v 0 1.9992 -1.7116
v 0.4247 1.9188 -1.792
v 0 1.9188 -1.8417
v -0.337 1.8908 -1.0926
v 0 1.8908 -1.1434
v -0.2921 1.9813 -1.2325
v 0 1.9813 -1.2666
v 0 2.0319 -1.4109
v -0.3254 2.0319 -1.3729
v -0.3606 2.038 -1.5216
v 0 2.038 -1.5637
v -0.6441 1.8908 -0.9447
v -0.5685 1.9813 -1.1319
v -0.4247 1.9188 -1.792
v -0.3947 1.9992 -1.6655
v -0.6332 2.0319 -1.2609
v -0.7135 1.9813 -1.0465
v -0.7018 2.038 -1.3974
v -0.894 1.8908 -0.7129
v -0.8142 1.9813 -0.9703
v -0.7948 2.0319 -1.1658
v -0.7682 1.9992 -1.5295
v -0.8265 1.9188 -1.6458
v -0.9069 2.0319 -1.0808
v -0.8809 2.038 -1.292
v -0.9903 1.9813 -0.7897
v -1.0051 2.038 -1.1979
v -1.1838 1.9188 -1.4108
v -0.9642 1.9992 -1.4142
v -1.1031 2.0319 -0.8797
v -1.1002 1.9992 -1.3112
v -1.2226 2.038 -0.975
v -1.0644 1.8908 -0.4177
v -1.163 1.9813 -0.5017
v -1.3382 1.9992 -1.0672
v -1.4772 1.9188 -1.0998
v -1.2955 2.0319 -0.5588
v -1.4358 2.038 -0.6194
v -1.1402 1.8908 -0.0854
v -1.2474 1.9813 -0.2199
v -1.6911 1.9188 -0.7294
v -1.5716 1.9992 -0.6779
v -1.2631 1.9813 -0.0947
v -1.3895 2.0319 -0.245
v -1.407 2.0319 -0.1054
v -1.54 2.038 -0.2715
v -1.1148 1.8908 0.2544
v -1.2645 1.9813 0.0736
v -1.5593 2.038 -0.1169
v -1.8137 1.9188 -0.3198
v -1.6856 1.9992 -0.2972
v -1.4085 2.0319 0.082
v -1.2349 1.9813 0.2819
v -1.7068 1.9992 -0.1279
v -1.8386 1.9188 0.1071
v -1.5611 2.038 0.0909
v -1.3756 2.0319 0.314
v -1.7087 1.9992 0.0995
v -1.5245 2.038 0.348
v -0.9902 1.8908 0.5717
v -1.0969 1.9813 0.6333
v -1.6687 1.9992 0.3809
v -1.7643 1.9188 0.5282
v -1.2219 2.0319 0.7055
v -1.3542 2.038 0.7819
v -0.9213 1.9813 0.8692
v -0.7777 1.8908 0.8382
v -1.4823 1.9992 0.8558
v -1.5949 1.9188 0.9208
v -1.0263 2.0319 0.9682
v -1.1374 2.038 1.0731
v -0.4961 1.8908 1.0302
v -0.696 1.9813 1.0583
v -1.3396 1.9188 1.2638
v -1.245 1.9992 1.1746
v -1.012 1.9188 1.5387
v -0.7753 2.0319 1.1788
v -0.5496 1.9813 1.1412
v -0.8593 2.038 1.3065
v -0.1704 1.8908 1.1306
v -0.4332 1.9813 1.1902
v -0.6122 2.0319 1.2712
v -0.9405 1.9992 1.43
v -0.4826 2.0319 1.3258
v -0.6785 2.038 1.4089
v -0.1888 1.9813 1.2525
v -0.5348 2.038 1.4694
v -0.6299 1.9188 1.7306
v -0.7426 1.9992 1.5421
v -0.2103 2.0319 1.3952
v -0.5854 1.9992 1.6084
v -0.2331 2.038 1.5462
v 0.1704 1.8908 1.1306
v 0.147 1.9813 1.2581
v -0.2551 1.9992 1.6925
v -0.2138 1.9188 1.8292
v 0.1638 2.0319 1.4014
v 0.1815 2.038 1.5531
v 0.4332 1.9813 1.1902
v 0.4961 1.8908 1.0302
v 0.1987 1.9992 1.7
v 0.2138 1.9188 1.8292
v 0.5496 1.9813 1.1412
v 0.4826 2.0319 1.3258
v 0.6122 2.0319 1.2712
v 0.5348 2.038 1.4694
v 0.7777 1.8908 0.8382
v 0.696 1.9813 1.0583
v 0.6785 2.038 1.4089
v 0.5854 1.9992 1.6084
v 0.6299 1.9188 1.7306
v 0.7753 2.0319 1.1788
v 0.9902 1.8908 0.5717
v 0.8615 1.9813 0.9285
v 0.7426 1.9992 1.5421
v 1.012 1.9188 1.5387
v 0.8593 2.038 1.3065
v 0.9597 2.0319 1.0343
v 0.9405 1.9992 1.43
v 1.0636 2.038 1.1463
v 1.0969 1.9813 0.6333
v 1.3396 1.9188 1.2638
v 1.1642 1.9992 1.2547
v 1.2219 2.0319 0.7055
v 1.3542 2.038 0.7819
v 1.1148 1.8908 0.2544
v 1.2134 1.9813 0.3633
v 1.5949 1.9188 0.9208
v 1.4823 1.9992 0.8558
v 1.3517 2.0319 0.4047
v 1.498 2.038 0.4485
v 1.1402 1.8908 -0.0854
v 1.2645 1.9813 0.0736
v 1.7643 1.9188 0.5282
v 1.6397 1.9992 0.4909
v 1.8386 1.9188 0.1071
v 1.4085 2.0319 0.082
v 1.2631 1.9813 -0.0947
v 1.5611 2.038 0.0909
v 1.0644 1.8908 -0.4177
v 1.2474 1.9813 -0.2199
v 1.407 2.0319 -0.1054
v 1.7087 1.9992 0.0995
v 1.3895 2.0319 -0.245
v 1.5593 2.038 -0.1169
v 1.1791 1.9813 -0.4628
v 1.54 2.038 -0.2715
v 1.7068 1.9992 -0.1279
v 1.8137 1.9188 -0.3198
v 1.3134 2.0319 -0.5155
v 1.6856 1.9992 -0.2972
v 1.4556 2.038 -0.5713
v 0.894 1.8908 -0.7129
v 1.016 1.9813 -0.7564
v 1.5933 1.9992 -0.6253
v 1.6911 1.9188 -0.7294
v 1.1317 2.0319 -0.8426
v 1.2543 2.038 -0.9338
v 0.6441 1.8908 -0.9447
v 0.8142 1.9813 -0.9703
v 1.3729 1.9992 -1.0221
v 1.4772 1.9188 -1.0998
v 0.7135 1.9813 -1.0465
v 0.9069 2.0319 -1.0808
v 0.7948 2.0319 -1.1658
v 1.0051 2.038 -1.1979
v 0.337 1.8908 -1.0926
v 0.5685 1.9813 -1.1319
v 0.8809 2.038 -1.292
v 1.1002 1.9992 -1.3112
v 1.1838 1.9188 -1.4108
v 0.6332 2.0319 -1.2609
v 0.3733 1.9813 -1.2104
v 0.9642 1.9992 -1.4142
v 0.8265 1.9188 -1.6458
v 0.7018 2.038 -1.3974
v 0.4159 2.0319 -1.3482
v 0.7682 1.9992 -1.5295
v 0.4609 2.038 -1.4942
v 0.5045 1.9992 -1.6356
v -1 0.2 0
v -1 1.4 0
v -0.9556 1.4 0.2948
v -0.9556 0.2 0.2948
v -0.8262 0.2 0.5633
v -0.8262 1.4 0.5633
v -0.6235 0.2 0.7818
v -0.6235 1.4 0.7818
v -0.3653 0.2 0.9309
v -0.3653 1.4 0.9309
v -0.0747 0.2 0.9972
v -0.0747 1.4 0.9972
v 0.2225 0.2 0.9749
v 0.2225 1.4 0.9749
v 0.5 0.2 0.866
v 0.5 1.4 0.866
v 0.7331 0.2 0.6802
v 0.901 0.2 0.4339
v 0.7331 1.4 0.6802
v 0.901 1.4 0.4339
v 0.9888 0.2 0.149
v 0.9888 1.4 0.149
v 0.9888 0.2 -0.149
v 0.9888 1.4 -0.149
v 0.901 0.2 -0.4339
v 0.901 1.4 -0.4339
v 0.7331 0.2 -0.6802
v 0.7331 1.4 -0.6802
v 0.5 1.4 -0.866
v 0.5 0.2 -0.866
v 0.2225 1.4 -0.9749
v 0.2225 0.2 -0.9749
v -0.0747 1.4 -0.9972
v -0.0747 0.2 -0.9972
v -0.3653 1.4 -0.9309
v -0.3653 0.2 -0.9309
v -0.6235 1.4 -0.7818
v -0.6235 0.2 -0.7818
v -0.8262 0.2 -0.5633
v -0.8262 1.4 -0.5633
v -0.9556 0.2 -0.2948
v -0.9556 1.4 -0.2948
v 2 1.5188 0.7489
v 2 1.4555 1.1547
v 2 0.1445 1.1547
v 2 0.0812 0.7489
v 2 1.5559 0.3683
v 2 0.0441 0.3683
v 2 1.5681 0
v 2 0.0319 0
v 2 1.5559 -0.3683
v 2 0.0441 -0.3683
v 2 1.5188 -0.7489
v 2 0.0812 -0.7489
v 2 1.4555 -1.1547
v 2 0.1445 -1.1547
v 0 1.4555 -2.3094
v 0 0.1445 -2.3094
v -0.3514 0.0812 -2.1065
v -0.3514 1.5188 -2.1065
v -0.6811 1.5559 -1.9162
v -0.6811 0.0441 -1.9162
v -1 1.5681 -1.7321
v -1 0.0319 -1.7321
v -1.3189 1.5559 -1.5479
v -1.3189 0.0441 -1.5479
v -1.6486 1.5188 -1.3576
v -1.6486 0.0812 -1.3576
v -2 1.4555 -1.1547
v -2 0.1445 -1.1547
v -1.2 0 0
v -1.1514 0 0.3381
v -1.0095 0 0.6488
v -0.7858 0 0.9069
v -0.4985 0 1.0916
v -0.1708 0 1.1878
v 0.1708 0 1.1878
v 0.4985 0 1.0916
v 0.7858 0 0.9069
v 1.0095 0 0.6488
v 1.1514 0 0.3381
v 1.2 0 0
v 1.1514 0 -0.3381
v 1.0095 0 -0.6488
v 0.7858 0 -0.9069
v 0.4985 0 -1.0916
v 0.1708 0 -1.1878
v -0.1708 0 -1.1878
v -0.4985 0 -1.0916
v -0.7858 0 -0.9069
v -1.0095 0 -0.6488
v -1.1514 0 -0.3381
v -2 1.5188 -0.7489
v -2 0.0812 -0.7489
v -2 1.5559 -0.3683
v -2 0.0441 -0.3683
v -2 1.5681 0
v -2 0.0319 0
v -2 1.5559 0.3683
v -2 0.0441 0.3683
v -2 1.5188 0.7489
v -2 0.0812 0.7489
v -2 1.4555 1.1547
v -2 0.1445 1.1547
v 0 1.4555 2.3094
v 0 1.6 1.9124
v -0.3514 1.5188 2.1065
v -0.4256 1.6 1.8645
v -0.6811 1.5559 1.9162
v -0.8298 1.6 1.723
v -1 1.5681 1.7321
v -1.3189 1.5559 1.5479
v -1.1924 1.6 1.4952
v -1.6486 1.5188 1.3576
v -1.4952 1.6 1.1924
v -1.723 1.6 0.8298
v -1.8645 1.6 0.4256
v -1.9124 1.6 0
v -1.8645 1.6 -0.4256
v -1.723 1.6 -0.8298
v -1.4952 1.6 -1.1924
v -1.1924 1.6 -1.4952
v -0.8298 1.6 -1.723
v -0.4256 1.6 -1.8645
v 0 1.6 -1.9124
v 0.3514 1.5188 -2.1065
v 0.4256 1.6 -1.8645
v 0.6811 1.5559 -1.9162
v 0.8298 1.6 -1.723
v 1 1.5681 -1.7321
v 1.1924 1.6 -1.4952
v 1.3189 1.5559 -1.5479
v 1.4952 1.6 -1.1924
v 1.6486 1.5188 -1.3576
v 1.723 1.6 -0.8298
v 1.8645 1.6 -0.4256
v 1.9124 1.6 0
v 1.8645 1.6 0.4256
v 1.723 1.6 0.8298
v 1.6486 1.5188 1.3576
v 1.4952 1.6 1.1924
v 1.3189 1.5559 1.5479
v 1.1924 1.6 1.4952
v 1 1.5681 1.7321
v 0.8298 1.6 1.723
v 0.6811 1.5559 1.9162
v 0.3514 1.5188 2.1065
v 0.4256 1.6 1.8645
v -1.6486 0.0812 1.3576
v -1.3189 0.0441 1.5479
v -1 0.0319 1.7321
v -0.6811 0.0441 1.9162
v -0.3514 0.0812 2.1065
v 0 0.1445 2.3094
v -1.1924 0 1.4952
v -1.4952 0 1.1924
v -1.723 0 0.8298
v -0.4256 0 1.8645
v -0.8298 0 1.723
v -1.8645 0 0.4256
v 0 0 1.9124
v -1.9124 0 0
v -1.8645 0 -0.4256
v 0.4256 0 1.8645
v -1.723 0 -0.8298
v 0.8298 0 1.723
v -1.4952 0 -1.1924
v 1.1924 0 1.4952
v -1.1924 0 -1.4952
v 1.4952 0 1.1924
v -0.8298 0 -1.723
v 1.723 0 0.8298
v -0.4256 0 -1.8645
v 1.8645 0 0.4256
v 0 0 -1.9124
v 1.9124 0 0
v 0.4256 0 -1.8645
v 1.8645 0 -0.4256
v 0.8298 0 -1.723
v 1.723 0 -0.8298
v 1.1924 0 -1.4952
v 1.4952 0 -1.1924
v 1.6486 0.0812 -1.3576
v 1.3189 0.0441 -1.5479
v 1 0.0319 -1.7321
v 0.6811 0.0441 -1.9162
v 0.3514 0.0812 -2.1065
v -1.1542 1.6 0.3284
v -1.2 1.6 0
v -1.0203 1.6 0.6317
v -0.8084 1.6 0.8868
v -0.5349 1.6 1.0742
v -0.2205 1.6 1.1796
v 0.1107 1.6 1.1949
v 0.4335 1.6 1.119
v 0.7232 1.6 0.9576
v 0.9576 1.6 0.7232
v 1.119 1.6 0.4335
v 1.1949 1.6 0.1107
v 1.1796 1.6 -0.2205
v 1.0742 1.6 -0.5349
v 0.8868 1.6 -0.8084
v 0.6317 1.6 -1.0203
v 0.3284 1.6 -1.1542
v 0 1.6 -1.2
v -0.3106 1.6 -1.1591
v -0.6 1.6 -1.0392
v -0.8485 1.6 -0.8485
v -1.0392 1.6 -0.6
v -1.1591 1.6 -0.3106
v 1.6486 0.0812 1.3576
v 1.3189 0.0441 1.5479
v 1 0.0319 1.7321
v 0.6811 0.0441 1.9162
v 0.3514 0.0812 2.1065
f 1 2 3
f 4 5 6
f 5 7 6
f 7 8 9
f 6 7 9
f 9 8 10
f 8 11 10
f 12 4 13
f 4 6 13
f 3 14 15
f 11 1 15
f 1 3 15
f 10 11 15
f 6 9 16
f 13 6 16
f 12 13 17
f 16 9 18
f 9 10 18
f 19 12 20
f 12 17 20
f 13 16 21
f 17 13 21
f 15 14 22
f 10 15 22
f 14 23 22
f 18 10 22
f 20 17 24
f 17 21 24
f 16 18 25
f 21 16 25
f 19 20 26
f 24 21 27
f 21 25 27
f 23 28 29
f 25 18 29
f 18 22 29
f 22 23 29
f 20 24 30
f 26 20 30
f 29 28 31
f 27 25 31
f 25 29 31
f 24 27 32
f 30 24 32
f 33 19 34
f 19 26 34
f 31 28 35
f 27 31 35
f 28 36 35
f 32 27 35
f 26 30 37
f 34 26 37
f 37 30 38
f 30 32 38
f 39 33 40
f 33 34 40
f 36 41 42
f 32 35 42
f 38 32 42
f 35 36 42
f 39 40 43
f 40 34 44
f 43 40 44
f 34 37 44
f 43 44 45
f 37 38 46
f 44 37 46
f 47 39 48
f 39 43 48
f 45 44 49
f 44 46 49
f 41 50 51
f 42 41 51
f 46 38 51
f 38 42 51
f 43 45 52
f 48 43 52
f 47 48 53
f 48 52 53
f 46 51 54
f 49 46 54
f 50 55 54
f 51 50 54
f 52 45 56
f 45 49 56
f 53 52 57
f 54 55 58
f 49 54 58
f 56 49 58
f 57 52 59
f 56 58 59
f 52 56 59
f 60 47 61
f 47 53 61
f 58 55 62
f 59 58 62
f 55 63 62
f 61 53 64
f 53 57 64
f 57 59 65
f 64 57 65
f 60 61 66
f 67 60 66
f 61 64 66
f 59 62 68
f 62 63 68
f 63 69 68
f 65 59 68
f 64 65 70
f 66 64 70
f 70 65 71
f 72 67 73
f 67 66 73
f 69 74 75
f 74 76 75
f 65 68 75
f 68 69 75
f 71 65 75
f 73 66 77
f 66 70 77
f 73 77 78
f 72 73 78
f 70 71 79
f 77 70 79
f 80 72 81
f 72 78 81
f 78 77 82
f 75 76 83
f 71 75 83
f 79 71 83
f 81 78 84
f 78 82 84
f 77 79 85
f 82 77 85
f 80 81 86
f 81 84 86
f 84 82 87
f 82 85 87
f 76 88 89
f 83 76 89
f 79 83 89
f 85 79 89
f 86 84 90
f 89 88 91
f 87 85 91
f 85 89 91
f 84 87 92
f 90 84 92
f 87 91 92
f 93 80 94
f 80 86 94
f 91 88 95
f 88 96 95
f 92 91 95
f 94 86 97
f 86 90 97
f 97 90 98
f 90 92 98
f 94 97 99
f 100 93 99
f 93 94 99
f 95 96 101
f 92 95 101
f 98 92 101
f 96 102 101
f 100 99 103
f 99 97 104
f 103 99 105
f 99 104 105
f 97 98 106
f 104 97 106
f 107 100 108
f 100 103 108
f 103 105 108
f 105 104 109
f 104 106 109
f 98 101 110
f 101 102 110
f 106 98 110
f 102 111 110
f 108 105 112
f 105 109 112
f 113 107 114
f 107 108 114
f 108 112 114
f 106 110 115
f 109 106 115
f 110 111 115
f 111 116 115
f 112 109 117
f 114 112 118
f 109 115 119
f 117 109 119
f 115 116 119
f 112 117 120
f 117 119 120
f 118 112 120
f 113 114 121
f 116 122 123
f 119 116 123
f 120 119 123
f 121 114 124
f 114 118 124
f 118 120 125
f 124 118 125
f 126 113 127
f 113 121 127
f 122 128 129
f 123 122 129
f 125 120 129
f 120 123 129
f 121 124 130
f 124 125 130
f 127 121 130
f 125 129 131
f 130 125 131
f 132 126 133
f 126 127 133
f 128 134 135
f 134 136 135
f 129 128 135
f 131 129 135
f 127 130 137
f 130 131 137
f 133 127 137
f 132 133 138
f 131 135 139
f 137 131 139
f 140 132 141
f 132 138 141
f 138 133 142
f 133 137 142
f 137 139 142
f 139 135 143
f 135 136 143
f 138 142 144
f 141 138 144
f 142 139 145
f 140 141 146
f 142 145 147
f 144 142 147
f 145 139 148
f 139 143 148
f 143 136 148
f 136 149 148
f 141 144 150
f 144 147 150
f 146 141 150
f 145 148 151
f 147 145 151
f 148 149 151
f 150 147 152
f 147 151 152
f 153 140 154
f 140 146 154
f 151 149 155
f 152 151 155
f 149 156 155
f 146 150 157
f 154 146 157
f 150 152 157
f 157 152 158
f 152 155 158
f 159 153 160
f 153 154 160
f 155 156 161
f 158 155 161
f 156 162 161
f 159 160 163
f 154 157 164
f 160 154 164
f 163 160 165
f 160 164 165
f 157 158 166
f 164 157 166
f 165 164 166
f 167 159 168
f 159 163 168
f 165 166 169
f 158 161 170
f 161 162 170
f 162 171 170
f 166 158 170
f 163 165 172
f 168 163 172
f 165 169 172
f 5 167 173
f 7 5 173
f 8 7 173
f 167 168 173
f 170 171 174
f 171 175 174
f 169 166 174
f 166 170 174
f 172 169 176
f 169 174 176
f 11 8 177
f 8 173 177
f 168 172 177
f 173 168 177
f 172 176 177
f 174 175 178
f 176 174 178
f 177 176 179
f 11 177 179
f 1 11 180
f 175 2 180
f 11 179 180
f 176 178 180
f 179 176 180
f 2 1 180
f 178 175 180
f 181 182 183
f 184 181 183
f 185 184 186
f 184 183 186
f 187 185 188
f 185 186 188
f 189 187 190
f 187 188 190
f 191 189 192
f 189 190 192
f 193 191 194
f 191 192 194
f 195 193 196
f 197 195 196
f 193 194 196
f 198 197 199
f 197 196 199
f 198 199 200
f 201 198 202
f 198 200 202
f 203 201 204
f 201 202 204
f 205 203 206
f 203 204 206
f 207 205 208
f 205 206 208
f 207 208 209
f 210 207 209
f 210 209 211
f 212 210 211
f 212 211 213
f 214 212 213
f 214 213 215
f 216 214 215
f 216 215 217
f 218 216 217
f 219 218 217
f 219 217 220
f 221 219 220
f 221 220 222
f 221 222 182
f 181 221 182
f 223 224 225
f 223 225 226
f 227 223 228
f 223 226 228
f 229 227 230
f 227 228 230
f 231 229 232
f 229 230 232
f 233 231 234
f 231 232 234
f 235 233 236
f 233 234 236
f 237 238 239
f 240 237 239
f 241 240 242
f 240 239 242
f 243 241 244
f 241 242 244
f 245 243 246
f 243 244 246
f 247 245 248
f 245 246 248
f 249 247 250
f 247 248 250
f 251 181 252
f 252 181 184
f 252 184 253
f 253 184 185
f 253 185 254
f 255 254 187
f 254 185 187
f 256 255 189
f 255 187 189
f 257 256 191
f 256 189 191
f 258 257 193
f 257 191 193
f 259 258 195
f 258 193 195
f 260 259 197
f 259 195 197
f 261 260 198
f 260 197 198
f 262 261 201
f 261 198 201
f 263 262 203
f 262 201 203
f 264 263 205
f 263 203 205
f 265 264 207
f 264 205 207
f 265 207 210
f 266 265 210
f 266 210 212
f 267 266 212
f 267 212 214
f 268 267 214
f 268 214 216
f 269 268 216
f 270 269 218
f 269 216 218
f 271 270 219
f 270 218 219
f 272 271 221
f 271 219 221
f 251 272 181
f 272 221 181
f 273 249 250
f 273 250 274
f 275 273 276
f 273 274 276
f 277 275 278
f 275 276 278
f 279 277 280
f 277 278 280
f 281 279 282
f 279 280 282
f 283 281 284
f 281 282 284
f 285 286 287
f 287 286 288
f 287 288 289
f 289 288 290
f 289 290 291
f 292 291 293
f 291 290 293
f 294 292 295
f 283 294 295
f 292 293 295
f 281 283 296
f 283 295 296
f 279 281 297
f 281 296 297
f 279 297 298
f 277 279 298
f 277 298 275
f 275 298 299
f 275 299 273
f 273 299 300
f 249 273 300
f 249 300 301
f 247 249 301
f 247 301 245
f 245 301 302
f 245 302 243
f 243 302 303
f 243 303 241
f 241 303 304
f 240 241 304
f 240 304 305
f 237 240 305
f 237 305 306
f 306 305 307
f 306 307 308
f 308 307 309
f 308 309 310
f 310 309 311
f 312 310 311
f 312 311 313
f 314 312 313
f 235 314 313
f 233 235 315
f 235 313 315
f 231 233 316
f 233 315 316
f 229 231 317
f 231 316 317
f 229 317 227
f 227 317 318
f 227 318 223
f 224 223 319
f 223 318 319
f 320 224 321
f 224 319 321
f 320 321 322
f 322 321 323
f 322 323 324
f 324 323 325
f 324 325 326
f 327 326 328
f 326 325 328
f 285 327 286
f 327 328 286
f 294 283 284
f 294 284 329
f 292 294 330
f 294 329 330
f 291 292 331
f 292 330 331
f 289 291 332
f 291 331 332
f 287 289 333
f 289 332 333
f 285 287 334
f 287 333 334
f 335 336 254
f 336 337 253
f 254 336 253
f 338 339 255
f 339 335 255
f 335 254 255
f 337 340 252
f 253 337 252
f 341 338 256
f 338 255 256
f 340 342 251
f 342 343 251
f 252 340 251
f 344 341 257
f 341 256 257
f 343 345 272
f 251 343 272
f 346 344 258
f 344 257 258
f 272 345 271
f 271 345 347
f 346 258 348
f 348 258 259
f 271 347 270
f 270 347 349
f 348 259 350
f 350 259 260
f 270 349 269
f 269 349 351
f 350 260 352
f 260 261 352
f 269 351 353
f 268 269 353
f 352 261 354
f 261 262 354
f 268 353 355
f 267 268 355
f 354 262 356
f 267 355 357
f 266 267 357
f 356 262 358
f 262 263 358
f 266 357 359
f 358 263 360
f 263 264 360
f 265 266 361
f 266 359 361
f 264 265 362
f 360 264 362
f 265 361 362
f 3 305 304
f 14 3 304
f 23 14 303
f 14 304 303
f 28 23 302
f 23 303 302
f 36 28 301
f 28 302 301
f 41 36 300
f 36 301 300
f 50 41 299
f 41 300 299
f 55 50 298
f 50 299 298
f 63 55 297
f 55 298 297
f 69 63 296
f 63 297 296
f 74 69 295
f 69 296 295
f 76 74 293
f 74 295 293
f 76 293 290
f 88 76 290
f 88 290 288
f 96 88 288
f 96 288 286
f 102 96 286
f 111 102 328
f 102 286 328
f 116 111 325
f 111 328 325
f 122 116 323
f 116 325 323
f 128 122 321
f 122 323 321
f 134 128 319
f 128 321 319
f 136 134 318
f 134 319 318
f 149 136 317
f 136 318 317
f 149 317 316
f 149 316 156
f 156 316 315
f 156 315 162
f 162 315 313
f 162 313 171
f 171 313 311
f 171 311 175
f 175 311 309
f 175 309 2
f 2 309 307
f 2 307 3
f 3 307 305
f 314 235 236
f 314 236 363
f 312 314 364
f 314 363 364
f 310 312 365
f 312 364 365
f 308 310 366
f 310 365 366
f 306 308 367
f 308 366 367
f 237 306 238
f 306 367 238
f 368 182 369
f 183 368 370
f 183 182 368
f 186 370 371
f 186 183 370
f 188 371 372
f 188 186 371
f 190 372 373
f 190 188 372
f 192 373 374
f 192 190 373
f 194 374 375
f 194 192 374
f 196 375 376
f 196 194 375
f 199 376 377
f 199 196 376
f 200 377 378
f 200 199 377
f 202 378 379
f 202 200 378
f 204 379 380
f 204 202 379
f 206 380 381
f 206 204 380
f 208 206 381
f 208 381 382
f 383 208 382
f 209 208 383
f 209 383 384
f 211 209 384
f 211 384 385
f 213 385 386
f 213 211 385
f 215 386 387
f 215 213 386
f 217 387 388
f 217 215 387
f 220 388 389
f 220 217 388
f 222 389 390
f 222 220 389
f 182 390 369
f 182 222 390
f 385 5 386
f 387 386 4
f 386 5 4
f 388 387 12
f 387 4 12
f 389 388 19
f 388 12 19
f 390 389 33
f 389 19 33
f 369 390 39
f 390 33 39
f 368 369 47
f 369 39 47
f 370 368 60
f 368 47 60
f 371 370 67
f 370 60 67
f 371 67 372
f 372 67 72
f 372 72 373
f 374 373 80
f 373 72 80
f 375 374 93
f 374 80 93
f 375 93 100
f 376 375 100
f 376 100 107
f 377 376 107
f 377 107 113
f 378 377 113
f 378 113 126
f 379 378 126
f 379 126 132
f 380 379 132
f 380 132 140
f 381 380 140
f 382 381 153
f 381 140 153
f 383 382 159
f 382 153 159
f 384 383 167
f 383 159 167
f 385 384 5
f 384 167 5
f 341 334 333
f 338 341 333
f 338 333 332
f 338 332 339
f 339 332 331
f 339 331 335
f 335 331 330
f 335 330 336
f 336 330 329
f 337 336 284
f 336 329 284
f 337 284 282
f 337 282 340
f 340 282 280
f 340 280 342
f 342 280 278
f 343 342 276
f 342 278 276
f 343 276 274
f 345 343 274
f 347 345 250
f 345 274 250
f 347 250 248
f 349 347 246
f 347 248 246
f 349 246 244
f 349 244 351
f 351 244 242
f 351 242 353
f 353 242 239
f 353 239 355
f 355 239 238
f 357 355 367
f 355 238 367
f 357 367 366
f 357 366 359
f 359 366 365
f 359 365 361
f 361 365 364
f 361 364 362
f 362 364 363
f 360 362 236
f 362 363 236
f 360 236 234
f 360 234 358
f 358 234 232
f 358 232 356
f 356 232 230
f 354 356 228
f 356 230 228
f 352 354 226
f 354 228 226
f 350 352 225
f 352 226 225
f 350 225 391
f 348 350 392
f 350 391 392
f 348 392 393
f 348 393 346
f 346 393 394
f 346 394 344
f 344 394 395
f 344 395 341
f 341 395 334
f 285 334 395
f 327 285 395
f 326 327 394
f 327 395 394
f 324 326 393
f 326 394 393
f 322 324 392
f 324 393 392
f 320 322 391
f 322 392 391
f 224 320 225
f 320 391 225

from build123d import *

# Parameters (mm, degrees)
EXTRUDE_1_DEPTH              = 1.6
HOLE_WIZARD_M2_1_D           = 1.6
HOLE_WIZARD_M2_1_DEPTH       = 6
HOLE_WIZARD_M2_1_CBORE_D     = 2
HOLE_WIZARD_M2_1_CBORE_DEPTH = 4
HOLE_WIZARD_M2_1_TIP         = 0.480688495
CHAMFER_1_SIZE               = 0.2


with BuildPart() as part:
    # 草图1 → 拉伸1 (new body)
    with BuildSketch(Plane(origin=(0, 0, 0), x_dir=(1, 0, 0), z_dir=(0, 1, 0))):
        Polygon((0, -2.309401077), (2, -1.154700538), (2, 1.154700538), (0, 2.309401077), (-2, 1.154700538), (-2, -1.154700538), align=None)
    extrude(amount=EXTRUDE_1_DEPTH)

    # M2 螺纹孔1
    with Locations(Plane(origin=(0, 1.6, 0), x_dir=(-1, 0, 0), z_dir=(0, 1, 0))):
        with Locations((0, 0)):
            CounterBoreHole(HOLE_WIZARD_M2_1_D / 2, HOLE_WIZARD_M2_1_CBORE_D / 2, HOLE_WIZARD_M2_1_CBORE_DEPTH, depth=HOLE_WIZARD_M2_1_DEPTH)
            with Locations((0, 0, -(HOLE_WIZARD_M2_1_DEPTH + HOLE_WIZARD_M2_1_TIP / 2))):  # 118° drill point
                Cone(0, HOLE_WIZARD_M2_1_D / 2, HOLE_WIZARD_M2_1_TIP, mode=Mode.SUBTRACT)

    # 草图4 → 切除-旋转2 (revolve, cut)
    with BuildSketch(Plane(origin=(0, 0, 0), x_dir=(0, 0, -1), z_dir=(1, 0, 0)), mode=Mode.PRIVATE) as cut_revolve_2_sk:
        Polygon((1.9124112, 0), (2.309401077, 0.144492499), (2.309401077, 0), align=None)
        Polygon((2.309401077, 1.6), (2.309401077, 1.455507501), (1.9124112, 1.6), align=None)
    revolve(cut_revolve_2_sk.sketch.rotate(Axis((0, 3.026713328, 0), (0, -1, 0)), 180), axis=Axis((0, 3.026713328, 0), (0, -1, 0)), mode=Mode.SUBTRACT)

    # 倒角1
    chamfer_1_edges = [part.edges().sort_by_distance(p)[0] for p in [
        (1, 0, 0),
        (1, 1.6, 0),
    ]]
    chamfer(chamfer_1_edges, length=CHAMFER_1_SIZE)

    # 草图5 → 旋转1 (revolve)
    with BuildSketch(Plane.XY, mode=Mode.PRIVATE) as revolve_1_sk:
        with BuildLine():
            Line((1.9124112, 1.6), (1.2, 1.6))
            Line((1.2, 1.6), (1.143418513, 1.890796389))
            ThreePointArc((1.143418513, 1.890796389), (1.487091006, 2.040622043), (1.841671491, 1.918838677))
            Line((1.841671491, 1.918838677), (1.9124112, 1.6))
        make_face()
    revolve(revolve_1_sk.sketch.rotate(Axis((0, 0, 0), (0, 1, 0)), 90), axis=Axis((0, 0, 0), (0, 1, 0)))


solid = part.part
